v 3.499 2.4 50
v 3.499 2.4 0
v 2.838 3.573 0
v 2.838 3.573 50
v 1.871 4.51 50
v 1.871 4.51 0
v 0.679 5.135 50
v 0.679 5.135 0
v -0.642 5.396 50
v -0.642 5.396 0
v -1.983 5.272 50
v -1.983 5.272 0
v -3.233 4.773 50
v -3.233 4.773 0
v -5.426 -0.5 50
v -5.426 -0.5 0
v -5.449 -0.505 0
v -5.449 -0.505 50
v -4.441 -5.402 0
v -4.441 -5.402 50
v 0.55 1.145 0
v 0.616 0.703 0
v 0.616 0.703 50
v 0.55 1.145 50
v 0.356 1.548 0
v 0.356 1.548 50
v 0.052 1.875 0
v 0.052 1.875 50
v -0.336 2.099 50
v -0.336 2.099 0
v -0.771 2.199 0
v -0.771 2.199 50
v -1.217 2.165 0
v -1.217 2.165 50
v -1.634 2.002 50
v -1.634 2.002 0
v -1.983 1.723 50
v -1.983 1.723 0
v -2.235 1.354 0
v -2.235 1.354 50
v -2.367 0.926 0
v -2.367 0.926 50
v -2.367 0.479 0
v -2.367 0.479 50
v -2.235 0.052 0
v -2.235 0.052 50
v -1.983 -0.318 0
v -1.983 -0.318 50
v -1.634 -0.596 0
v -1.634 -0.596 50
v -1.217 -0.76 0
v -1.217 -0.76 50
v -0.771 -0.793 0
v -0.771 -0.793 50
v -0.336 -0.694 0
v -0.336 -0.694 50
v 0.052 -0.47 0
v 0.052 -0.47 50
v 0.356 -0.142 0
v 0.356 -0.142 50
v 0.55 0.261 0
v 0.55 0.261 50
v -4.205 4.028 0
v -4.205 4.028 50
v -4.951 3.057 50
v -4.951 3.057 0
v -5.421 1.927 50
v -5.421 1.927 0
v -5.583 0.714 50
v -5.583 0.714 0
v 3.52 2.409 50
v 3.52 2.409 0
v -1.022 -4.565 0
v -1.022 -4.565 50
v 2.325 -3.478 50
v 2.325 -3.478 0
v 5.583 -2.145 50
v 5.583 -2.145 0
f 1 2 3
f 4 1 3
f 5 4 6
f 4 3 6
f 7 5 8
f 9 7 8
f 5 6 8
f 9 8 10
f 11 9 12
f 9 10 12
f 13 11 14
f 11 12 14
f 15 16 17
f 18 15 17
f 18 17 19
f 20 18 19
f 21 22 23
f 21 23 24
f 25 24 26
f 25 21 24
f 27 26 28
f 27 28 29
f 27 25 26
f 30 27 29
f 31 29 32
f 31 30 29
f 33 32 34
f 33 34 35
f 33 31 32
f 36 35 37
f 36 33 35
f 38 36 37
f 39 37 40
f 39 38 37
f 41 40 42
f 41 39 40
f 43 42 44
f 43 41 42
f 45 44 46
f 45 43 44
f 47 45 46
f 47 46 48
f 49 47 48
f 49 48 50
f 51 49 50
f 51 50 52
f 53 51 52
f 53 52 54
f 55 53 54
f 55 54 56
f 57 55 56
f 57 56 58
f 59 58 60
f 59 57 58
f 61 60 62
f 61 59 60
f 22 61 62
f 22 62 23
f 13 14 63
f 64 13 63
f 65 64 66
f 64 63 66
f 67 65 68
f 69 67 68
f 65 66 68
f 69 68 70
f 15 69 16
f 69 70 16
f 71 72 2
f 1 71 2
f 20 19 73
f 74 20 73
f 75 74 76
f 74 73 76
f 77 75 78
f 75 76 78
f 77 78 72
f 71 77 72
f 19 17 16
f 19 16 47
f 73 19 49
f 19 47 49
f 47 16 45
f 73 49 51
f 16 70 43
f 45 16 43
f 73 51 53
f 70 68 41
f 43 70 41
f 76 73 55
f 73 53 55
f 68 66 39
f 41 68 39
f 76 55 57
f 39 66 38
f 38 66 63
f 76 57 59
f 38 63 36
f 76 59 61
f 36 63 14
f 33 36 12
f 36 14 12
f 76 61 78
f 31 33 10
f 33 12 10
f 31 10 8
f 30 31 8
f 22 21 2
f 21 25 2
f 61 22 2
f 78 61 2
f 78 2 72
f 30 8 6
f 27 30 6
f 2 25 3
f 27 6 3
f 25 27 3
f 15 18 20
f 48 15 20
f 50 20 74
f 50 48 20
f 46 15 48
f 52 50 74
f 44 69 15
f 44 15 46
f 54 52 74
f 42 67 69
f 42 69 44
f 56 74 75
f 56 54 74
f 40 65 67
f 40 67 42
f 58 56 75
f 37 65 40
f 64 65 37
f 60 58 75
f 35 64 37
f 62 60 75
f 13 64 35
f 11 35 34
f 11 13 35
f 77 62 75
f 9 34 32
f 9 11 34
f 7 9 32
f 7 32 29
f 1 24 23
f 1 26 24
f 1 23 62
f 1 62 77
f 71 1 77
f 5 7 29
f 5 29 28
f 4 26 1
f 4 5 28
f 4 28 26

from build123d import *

# Parameters (mm, degrees)
F0_R     = 1.5
F1_DEPTH = 50


# Not quite as in the source:
# - ends of sketch curves that miss each other by under 0.0002 mm in the source are joined


with BuildPart() as f1:
    # F0 (on Top) → F1 (new body)
    with BuildSketch(Plane.XY):
        with BuildLine():
            Line((-5.449118, -0.504862), (-4.441162, -5.402211))
            ThreePointArc((-4.441162, -5.402211), (0.6615584195, -4.0525834634), (5.5830371113, -2.1451512457))
            Line((5.5830371113, -2.1451512457), (3.519902, 2.409349))
            Line((3.519902, 2.409349), (3.498846, 2.399818))
            ThreePointArc((3.498846, 2.399818), (0.6786519051, 5.1349674747), (-3.2332818366, 4.772594717))
            ThreePointArc((-3.2332818366, 4.772594717), (-5.2226446667, 2.5075404986), (-5.4264814855, -0.5001971285))
            Line((-5.4264814855, -0.5001971285), (-5.449118, -0.504862))
        make_face()
        with Locations((-0.883526, 0.702699)):
            Circle(F0_R, mode=Mode.SUBTRACT)
    extrude(amount=F1_DEPTH)


solid = f1.part
